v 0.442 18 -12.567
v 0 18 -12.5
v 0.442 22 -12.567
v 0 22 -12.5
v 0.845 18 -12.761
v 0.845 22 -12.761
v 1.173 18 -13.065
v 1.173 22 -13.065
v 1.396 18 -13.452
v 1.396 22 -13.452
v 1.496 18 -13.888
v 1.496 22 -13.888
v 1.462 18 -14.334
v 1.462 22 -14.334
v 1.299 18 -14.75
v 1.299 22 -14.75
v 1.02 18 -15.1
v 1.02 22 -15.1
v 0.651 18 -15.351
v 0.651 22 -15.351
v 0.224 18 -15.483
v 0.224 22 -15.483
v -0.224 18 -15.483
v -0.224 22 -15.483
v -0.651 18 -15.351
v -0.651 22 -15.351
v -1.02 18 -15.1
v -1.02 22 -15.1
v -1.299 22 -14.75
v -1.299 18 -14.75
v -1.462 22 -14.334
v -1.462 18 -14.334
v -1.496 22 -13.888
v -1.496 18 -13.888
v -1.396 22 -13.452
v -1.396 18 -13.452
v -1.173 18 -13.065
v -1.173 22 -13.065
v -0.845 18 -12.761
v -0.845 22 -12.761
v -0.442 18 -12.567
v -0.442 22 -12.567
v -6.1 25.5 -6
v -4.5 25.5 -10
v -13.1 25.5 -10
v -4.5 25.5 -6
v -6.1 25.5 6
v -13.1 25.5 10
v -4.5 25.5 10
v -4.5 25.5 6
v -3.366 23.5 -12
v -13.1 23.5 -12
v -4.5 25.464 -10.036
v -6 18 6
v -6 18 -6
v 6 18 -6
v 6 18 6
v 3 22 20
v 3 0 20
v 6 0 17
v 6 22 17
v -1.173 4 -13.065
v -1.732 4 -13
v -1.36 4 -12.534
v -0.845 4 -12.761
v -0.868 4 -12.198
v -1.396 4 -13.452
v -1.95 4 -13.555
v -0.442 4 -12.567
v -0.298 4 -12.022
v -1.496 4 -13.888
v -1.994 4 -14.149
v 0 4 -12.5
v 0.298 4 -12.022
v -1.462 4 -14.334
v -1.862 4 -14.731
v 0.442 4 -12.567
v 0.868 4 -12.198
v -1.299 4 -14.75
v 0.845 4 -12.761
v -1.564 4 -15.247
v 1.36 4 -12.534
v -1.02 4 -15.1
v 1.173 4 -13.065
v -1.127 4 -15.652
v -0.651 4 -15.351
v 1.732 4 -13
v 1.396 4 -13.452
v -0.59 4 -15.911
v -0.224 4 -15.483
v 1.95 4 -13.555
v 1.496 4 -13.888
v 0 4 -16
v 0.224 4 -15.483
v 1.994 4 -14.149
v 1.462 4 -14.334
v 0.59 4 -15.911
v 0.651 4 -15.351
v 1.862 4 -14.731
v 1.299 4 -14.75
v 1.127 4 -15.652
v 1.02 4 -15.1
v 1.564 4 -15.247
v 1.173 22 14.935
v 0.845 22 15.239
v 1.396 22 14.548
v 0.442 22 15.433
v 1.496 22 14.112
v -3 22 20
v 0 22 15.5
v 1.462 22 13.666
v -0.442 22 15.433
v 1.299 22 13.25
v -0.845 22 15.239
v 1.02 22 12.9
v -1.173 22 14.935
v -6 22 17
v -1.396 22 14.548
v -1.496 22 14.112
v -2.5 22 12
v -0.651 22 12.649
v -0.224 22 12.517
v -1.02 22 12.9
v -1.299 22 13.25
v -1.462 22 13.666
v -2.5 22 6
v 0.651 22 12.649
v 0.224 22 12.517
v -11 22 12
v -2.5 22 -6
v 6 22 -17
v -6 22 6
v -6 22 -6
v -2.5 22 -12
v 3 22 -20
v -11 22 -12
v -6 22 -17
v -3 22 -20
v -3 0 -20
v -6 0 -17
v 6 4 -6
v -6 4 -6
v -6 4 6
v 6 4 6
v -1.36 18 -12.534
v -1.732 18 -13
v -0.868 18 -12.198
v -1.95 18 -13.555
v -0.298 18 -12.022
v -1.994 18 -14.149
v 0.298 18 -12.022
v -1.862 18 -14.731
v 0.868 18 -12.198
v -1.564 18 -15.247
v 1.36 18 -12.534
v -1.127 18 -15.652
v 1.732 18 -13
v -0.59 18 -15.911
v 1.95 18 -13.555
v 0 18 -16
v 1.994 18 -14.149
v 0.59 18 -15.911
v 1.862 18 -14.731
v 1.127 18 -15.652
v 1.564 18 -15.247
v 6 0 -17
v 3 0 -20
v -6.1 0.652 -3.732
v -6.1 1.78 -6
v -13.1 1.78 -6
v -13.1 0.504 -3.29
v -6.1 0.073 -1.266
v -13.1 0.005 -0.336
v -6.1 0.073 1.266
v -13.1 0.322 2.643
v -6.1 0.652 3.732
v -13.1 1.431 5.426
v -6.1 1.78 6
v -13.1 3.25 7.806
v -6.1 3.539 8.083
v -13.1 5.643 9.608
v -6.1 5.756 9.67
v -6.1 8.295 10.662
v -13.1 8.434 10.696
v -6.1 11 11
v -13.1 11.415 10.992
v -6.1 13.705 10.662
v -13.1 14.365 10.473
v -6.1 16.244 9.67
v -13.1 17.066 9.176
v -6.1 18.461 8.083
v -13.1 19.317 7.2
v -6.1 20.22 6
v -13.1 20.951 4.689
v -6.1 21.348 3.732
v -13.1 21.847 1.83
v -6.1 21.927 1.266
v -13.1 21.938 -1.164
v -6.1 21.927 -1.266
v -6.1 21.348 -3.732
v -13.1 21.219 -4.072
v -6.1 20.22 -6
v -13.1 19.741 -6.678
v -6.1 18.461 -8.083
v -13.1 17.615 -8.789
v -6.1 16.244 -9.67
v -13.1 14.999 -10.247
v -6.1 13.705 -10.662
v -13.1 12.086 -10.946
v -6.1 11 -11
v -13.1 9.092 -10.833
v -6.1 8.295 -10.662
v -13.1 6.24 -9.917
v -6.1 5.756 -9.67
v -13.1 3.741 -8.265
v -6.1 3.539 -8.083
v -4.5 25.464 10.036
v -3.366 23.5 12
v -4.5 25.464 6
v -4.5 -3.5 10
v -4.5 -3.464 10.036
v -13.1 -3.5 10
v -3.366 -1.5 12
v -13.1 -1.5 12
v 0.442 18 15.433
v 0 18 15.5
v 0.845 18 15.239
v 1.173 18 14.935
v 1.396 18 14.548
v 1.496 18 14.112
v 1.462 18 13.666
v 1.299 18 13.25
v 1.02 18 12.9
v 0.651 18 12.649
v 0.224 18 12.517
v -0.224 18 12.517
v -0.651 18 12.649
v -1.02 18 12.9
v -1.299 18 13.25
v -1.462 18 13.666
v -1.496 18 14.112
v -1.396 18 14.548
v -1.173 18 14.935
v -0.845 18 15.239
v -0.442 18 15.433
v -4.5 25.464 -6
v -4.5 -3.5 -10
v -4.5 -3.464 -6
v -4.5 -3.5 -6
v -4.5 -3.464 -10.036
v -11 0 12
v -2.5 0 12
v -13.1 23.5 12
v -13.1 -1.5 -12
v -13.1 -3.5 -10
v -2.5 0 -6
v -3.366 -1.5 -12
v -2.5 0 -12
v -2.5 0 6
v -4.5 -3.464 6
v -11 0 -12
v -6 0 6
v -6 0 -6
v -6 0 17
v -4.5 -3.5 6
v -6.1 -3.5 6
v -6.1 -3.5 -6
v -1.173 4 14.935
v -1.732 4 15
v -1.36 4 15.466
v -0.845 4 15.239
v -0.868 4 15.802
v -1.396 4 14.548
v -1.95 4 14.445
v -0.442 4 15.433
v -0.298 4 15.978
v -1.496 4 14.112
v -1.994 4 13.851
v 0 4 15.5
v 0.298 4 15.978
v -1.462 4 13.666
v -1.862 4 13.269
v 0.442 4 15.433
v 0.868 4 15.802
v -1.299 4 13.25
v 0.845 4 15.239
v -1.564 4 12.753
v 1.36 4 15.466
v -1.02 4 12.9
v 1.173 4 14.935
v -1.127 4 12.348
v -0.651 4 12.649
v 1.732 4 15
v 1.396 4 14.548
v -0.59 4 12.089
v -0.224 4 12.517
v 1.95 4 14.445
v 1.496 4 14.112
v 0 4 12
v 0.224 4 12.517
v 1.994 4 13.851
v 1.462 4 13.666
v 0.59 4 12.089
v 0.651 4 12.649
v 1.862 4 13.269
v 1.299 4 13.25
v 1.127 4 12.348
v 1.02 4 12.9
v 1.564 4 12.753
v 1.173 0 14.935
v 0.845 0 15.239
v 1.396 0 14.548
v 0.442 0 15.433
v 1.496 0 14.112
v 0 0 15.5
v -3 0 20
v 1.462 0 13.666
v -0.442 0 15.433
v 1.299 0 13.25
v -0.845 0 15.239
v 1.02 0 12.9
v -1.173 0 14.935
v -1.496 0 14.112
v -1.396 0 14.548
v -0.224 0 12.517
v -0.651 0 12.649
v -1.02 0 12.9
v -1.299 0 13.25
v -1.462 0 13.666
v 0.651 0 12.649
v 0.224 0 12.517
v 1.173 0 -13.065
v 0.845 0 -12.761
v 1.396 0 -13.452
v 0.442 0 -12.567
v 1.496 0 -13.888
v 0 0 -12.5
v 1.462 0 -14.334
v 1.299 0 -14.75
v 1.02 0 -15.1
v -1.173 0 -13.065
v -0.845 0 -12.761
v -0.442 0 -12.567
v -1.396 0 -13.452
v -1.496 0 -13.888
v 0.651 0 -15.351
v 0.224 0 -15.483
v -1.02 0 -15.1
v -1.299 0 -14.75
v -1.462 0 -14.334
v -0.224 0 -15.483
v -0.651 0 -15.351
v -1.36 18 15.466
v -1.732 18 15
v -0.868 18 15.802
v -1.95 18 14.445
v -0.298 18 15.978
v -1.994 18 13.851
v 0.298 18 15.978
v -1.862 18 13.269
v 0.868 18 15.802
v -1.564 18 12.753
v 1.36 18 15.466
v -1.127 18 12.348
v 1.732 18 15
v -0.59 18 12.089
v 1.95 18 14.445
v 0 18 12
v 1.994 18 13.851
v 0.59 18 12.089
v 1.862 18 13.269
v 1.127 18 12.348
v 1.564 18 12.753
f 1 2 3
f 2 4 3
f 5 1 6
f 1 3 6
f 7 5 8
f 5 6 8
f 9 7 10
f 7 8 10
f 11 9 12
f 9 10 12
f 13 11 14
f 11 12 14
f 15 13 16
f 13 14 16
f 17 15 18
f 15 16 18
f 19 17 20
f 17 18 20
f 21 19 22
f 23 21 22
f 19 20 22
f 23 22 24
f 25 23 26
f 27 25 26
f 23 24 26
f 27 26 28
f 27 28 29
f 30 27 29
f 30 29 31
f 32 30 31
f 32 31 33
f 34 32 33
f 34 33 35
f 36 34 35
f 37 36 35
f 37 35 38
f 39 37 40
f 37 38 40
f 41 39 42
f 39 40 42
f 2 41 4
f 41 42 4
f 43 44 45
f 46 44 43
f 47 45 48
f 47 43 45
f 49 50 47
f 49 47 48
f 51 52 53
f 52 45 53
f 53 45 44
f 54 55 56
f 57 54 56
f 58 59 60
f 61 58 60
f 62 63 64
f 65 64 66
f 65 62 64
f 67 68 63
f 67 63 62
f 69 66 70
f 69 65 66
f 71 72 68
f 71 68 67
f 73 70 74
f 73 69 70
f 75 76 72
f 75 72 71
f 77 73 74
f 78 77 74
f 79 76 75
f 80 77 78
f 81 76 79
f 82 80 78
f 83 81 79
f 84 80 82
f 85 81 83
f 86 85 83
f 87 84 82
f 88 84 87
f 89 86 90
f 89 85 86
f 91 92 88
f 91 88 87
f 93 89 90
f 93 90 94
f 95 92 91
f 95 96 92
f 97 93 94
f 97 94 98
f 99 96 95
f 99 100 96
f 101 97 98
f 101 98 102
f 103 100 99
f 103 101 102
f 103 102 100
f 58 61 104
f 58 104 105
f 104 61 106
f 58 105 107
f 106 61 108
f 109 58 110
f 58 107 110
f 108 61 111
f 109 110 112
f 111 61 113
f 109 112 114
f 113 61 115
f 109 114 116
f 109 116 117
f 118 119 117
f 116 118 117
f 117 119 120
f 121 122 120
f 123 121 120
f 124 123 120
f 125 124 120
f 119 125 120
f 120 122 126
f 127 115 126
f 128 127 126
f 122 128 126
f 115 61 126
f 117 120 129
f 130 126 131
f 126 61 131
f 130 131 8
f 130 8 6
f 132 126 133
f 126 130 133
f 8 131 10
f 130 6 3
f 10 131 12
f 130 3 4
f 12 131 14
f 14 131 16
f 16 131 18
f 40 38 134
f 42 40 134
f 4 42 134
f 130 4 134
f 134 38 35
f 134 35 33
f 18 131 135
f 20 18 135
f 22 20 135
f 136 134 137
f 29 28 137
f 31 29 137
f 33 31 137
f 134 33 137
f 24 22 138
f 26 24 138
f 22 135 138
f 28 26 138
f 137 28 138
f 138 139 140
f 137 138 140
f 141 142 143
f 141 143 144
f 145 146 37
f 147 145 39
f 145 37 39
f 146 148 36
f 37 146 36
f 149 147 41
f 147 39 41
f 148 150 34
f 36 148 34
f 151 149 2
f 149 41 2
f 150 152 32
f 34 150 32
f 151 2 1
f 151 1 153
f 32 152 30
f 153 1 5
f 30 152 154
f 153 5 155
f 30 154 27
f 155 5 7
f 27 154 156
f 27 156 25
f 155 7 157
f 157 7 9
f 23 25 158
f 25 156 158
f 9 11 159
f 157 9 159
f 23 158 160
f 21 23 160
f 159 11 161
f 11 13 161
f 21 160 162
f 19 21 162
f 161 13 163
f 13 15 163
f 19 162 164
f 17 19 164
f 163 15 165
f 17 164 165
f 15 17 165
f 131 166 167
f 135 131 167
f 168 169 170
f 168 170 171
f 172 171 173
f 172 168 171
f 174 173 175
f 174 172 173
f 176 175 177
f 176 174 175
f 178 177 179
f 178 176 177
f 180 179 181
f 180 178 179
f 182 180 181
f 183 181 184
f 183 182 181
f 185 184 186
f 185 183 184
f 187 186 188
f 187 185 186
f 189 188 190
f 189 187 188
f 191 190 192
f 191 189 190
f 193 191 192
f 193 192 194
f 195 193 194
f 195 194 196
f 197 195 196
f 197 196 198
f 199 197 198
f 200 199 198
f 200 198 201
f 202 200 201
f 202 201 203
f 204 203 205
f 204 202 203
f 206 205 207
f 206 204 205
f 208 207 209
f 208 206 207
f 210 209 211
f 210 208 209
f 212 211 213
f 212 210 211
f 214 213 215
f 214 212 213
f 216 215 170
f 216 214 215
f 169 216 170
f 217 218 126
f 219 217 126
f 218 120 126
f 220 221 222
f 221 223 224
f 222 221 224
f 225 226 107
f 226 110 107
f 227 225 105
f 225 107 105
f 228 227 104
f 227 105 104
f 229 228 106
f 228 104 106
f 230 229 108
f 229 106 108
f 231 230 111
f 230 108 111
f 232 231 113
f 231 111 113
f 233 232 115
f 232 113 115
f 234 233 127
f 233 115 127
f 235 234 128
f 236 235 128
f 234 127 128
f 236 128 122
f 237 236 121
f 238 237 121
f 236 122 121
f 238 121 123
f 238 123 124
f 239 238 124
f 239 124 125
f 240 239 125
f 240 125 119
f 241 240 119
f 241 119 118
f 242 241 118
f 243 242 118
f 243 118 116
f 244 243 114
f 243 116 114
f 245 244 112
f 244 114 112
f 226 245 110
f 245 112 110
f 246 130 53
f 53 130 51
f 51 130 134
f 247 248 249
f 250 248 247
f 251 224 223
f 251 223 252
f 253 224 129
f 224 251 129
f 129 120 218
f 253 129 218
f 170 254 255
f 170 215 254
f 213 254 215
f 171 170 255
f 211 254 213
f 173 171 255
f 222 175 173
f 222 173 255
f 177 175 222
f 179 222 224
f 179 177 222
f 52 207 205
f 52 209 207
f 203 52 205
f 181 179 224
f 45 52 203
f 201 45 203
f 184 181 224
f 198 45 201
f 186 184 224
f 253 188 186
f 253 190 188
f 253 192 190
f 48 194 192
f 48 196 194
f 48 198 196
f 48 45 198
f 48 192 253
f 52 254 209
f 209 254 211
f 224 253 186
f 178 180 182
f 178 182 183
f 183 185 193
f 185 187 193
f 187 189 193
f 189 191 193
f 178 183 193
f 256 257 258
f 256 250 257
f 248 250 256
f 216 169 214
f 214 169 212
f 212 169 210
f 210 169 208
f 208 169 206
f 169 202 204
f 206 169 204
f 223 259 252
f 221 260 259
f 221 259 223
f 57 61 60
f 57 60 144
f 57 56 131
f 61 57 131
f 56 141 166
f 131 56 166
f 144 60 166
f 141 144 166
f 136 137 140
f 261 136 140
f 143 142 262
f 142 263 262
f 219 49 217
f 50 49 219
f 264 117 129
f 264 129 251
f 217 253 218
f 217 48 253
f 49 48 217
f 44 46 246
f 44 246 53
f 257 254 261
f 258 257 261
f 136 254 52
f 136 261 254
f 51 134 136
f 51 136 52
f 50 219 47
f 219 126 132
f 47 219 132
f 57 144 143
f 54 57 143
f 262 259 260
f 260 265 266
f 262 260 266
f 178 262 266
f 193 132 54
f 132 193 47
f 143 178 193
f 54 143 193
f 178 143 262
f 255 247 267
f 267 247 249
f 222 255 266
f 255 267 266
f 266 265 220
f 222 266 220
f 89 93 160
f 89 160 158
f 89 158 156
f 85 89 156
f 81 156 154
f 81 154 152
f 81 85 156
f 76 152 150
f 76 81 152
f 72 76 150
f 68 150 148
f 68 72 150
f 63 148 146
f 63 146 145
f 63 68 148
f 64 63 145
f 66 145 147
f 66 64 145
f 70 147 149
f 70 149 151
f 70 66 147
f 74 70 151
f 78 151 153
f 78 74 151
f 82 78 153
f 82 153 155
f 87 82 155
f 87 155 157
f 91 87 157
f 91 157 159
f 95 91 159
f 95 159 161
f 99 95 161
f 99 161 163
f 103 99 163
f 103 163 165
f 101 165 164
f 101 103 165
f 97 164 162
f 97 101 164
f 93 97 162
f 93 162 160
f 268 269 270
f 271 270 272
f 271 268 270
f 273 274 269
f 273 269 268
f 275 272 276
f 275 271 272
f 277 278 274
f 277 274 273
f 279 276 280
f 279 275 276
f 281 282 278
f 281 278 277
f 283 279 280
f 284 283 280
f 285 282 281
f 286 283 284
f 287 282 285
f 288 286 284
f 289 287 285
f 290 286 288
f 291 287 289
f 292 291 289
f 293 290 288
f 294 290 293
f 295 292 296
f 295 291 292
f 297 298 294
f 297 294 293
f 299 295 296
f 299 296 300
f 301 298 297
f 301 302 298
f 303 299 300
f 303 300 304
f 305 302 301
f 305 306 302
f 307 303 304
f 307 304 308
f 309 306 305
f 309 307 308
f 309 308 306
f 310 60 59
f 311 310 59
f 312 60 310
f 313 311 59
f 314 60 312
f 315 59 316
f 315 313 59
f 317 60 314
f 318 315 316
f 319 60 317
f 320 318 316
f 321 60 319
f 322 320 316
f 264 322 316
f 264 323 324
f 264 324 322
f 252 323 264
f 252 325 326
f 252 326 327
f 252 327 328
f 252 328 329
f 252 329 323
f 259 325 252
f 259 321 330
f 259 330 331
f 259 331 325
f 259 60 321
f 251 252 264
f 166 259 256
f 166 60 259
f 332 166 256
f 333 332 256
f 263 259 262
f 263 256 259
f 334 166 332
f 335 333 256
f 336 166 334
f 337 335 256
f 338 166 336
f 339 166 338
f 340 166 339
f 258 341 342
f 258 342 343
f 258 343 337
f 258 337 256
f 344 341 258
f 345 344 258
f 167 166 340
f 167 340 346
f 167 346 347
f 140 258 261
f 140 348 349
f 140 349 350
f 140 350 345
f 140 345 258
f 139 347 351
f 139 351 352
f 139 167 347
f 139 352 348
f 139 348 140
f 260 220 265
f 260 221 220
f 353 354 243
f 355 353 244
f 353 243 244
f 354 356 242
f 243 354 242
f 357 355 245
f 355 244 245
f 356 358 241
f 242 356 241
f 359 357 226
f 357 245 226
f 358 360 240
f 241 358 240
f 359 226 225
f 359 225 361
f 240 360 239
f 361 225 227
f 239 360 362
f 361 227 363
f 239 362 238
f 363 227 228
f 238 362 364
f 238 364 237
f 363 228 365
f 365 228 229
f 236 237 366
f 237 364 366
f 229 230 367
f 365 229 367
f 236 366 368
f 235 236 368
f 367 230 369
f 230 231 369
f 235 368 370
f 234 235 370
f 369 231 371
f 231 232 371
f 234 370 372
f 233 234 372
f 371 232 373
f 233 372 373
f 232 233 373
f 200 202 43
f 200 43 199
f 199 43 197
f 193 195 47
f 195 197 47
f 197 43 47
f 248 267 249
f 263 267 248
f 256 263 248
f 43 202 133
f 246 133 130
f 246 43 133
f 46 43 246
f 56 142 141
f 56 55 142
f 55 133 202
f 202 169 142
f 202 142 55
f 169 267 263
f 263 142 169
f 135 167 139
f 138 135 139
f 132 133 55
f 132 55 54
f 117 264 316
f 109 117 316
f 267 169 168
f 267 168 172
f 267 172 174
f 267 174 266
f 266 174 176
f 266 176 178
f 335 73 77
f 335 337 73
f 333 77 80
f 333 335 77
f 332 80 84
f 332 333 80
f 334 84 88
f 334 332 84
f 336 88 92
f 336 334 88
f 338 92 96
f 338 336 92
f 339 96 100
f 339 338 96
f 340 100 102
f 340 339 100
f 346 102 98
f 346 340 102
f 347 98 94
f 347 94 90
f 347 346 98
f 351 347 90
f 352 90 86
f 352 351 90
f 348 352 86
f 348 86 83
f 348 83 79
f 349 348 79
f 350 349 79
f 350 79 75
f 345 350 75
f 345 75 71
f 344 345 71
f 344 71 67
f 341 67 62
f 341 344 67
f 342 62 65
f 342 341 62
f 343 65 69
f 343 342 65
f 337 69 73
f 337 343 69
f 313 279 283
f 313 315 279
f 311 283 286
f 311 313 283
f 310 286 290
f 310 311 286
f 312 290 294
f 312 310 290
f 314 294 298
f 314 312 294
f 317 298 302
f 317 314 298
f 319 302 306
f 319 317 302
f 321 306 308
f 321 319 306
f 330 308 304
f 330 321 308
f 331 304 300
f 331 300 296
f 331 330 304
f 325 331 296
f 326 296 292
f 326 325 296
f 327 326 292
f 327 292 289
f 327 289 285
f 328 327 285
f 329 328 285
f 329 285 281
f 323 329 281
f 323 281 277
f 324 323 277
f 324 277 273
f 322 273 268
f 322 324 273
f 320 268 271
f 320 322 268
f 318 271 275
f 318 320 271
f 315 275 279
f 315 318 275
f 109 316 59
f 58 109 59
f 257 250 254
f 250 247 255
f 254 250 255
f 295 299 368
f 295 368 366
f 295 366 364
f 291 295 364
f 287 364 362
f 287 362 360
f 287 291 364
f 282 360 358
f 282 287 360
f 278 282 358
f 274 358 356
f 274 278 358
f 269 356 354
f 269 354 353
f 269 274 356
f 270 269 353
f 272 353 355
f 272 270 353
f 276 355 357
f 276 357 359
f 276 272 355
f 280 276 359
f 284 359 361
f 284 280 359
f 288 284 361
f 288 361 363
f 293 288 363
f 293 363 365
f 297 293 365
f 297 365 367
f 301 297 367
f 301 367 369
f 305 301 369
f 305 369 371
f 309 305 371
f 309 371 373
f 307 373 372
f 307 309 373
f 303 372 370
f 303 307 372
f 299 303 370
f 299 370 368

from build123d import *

# Parameters (mm, degrees)
SKETCH1_R                 = 1.5
BOSS_EXTRUDE1_DEPTH       = 3
BOSS_EXTRUDE2_START       = 22.5
SKETCH2_W                 = 1.6
SKETCH2_H                 = 6
BOSS_EXTRUDE2_DEPTH       = 29
SKETCH4_R                 = 1.5
BOSS_EXTRUDE5_DEPTH       = 1
CHAMFER2_SIZE             = 2
CHAMFER2_SIZE2            = 3.464101615
SKETCH3_W                 = 24
SKETCH3_H                 = 29
SKETCH3_R                 = 11
BOSS_EXTRUDE4_DEPTH       = 7
CHAMFER3_SIZE             = 2
CHAMFER2_OF_MIRROR1_SIZE2 = 2
CHAMFER2_OF_MIRROR1_SIZE  = 3.464101615
SKETCH5_R                 = 2
BOSS_EXTRUDE6_DEPTH       = 14
CHAMFER5_SIZE             = 5


with BuildPart() as part:
    # Sketch1 → Boss-Extrude1 (new body)
    with BuildSketch(Plane(origin=(0, 0, 0), x_dir=(1, 0, 0), z_dir=(0, 1, 0))):
        Polygon((-6, 17), (-3, 20), (3, 20), (6, 17), (6, -17), (3, -20), (-3, -20), (-6, -17), align=None)
        with Locations(Location((0, 14, 0), (0, 0, 270))):
            Circle(SKETCH1_R, mode=Mode.SUBTRACT)
        with Locations(Location((0, -14, 0), (0, 0, 270))):
            Circle(SKETCH1_R, mode=Mode.SUBTRACT)
    boss_extrude1 = extrude(amount=BOSS_EXTRUDE1_DEPTH)

    # Sketch2 → Boss-Extrude2 (add)
    with BuildSketch(Plane(origin=(0, 3, 0), x_dir=(1, 0, 0), z_dir=(0, 1, 0)).offset(BOSS_EXTRUDE2_START)):
        with Locations((-5.3, 9)):
            Rectangle(SKETCH2_W, SKETCH2_H)
        with Locations((-5.3, -9)):
            Rectangle(SKETCH2_W, SKETCH2_H)
    extrude(amount=-BOSS_EXTRUDE2_DEPTH)

    # Sketch4 → Boss-Extrude5 (add)
    with BuildSketch(Plane(origin=(0, 3, 0), x_dir=(1, 0, 0), z_dir=(0, 1, 0))):
        Polygon((-3, 20), (-6, 17), (-6, 12), (-4.5, 12), (-4.5, 6), (-6, 6), (-6, -6), (-4.5, -6), (-4.5, -12), (-6, -12), (-6, -17), (-3, -20), (3, -20), (6, -17), (6, 17), (3, 20), align=None)
        with Locations(Location((0, 14, 0), (0, 0, 270))):
            Circle(SKETCH4_R, mode=Mode.SUBTRACT)
        with Locations(Location((0, -14, 0), (0, 0, 270))):
            Circle(SKETCH4_R, mode=Mode.SUBTRACT)
    boss_extrude5 = extrude(amount=BOSS_EXTRUDE5_DEPTH)

    # Chamfer2
    chamfer2_edges = [part.edges().sort_by_distance(p)[0] for p in [
        (-4.5, 0, 9),
        (-4.5, 0, -9),
    ]]
    chamfer2_side = [part.faces().sort_by_distance(p)[0] for p in [
        (0.219837568, 0, 0),
    ]]
    chamfer(chamfer2_edges, length=CHAMFER2_SIZE, length2=CHAMFER2_SIZE2, reference=chamfer2_side[0])

    # Sketch3 → Boss-Extrude4 (add)
    with BuildSketch(Plane.ZY.offset(6.1)):
        with Locations((0, 11)):
            Rectangle(SKETCH3_W, SKETCH3_H)
        with Locations(Location((0, 11, 0), (0, 0, 236.944268849))):
            Circle(SKETCH3_R, mode=Mode.SUBTRACT)
    extrude(amount=BOSS_EXTRUDE4_DEPTH)

    # Chamfer3
    chamfer3_edges = [part.edges().sort_by_distance(p)[0] for p in [
        (-8.8, 25.5, -12),
        (-8.8, -3.5, -12),
        (-8.8, -3.5, 12),
        (-8.8, 25.5, 12),
    ]]
    chamfer(chamfer3_edges, length=CHAMFER3_SIZE)

    # Mirror1: Boss-Extrude1, Boss-Extrude5 across plane
    add(boss_extrude1.mirror(Plane(origin=(0, 11, 0), x_dir=(0, 0, 1), z_dir=(0, -1, 0))))
    add(boss_extrude5.mirror(Plane(origin=(0, 11, 0), x_dir=(0, 0, 1), z_dir=(0, -1, 0))))

    # Chamfer2 of Mirror1
    chamfer2_of_mirror1_edges = [part.edges().sort_by_distance(p)[0] for p in [
        (-4.5, 22, 9),
        (-4.5, 22, -9),
    ]]
    chamfer(chamfer2_of_mirror1_edges, length=CHAMFER2_OF_MIRROR1_SIZE, length2=CHAMFER2_OF_MIRROR1_SIZE2)

    # Sketch5 → Boss-Extrude6 (add)
    # profile 1 of 2: a face of its own
    with BuildSketch(Plane(origin=(0, 4, 0), x_dir=(1, 0, 0), z_dir=(0, 1, 0))):
        Polygon((6, -6), (-6, -6), (-6, -17), (-3, -20), (3, -20), (6, -17), align=None)
        with Locations(Location((0, -14, 0), (0, 0, 90))):
            Circle(SKETCH5_R, mode=Mode.SUBTRACT)
    # profile 2 of 2: a face of its own
    with BuildSketch(Plane(origin=(0, 4, 0), x_dir=(1, 0, 0), z_dir=(0, 1, 0))):
        Polygon((-6, 17), (-6, 6), (6, 6), (6, 17), (3, 20), (-3, 20), align=None)
        with Locations(Location((0, 14, 0), (0, 0, 90))):
            Circle(SKETCH5_R, mode=Mode.SUBTRACT)
    extrude(amount=BOSS_EXTRUDE6_DEPTH)

    # Chamfer5
    chamfer5_edges = [part.edges().sort_by_distance(p)[0] for p in [
        (-6, 11, 12),
        (-6, 11, -12),
    ]]
    chamfer(chamfer5_edges, length=CHAMFER5_SIZE - 0.0001)  # a hair under: the kernel refuses the full size


solid = part.part
